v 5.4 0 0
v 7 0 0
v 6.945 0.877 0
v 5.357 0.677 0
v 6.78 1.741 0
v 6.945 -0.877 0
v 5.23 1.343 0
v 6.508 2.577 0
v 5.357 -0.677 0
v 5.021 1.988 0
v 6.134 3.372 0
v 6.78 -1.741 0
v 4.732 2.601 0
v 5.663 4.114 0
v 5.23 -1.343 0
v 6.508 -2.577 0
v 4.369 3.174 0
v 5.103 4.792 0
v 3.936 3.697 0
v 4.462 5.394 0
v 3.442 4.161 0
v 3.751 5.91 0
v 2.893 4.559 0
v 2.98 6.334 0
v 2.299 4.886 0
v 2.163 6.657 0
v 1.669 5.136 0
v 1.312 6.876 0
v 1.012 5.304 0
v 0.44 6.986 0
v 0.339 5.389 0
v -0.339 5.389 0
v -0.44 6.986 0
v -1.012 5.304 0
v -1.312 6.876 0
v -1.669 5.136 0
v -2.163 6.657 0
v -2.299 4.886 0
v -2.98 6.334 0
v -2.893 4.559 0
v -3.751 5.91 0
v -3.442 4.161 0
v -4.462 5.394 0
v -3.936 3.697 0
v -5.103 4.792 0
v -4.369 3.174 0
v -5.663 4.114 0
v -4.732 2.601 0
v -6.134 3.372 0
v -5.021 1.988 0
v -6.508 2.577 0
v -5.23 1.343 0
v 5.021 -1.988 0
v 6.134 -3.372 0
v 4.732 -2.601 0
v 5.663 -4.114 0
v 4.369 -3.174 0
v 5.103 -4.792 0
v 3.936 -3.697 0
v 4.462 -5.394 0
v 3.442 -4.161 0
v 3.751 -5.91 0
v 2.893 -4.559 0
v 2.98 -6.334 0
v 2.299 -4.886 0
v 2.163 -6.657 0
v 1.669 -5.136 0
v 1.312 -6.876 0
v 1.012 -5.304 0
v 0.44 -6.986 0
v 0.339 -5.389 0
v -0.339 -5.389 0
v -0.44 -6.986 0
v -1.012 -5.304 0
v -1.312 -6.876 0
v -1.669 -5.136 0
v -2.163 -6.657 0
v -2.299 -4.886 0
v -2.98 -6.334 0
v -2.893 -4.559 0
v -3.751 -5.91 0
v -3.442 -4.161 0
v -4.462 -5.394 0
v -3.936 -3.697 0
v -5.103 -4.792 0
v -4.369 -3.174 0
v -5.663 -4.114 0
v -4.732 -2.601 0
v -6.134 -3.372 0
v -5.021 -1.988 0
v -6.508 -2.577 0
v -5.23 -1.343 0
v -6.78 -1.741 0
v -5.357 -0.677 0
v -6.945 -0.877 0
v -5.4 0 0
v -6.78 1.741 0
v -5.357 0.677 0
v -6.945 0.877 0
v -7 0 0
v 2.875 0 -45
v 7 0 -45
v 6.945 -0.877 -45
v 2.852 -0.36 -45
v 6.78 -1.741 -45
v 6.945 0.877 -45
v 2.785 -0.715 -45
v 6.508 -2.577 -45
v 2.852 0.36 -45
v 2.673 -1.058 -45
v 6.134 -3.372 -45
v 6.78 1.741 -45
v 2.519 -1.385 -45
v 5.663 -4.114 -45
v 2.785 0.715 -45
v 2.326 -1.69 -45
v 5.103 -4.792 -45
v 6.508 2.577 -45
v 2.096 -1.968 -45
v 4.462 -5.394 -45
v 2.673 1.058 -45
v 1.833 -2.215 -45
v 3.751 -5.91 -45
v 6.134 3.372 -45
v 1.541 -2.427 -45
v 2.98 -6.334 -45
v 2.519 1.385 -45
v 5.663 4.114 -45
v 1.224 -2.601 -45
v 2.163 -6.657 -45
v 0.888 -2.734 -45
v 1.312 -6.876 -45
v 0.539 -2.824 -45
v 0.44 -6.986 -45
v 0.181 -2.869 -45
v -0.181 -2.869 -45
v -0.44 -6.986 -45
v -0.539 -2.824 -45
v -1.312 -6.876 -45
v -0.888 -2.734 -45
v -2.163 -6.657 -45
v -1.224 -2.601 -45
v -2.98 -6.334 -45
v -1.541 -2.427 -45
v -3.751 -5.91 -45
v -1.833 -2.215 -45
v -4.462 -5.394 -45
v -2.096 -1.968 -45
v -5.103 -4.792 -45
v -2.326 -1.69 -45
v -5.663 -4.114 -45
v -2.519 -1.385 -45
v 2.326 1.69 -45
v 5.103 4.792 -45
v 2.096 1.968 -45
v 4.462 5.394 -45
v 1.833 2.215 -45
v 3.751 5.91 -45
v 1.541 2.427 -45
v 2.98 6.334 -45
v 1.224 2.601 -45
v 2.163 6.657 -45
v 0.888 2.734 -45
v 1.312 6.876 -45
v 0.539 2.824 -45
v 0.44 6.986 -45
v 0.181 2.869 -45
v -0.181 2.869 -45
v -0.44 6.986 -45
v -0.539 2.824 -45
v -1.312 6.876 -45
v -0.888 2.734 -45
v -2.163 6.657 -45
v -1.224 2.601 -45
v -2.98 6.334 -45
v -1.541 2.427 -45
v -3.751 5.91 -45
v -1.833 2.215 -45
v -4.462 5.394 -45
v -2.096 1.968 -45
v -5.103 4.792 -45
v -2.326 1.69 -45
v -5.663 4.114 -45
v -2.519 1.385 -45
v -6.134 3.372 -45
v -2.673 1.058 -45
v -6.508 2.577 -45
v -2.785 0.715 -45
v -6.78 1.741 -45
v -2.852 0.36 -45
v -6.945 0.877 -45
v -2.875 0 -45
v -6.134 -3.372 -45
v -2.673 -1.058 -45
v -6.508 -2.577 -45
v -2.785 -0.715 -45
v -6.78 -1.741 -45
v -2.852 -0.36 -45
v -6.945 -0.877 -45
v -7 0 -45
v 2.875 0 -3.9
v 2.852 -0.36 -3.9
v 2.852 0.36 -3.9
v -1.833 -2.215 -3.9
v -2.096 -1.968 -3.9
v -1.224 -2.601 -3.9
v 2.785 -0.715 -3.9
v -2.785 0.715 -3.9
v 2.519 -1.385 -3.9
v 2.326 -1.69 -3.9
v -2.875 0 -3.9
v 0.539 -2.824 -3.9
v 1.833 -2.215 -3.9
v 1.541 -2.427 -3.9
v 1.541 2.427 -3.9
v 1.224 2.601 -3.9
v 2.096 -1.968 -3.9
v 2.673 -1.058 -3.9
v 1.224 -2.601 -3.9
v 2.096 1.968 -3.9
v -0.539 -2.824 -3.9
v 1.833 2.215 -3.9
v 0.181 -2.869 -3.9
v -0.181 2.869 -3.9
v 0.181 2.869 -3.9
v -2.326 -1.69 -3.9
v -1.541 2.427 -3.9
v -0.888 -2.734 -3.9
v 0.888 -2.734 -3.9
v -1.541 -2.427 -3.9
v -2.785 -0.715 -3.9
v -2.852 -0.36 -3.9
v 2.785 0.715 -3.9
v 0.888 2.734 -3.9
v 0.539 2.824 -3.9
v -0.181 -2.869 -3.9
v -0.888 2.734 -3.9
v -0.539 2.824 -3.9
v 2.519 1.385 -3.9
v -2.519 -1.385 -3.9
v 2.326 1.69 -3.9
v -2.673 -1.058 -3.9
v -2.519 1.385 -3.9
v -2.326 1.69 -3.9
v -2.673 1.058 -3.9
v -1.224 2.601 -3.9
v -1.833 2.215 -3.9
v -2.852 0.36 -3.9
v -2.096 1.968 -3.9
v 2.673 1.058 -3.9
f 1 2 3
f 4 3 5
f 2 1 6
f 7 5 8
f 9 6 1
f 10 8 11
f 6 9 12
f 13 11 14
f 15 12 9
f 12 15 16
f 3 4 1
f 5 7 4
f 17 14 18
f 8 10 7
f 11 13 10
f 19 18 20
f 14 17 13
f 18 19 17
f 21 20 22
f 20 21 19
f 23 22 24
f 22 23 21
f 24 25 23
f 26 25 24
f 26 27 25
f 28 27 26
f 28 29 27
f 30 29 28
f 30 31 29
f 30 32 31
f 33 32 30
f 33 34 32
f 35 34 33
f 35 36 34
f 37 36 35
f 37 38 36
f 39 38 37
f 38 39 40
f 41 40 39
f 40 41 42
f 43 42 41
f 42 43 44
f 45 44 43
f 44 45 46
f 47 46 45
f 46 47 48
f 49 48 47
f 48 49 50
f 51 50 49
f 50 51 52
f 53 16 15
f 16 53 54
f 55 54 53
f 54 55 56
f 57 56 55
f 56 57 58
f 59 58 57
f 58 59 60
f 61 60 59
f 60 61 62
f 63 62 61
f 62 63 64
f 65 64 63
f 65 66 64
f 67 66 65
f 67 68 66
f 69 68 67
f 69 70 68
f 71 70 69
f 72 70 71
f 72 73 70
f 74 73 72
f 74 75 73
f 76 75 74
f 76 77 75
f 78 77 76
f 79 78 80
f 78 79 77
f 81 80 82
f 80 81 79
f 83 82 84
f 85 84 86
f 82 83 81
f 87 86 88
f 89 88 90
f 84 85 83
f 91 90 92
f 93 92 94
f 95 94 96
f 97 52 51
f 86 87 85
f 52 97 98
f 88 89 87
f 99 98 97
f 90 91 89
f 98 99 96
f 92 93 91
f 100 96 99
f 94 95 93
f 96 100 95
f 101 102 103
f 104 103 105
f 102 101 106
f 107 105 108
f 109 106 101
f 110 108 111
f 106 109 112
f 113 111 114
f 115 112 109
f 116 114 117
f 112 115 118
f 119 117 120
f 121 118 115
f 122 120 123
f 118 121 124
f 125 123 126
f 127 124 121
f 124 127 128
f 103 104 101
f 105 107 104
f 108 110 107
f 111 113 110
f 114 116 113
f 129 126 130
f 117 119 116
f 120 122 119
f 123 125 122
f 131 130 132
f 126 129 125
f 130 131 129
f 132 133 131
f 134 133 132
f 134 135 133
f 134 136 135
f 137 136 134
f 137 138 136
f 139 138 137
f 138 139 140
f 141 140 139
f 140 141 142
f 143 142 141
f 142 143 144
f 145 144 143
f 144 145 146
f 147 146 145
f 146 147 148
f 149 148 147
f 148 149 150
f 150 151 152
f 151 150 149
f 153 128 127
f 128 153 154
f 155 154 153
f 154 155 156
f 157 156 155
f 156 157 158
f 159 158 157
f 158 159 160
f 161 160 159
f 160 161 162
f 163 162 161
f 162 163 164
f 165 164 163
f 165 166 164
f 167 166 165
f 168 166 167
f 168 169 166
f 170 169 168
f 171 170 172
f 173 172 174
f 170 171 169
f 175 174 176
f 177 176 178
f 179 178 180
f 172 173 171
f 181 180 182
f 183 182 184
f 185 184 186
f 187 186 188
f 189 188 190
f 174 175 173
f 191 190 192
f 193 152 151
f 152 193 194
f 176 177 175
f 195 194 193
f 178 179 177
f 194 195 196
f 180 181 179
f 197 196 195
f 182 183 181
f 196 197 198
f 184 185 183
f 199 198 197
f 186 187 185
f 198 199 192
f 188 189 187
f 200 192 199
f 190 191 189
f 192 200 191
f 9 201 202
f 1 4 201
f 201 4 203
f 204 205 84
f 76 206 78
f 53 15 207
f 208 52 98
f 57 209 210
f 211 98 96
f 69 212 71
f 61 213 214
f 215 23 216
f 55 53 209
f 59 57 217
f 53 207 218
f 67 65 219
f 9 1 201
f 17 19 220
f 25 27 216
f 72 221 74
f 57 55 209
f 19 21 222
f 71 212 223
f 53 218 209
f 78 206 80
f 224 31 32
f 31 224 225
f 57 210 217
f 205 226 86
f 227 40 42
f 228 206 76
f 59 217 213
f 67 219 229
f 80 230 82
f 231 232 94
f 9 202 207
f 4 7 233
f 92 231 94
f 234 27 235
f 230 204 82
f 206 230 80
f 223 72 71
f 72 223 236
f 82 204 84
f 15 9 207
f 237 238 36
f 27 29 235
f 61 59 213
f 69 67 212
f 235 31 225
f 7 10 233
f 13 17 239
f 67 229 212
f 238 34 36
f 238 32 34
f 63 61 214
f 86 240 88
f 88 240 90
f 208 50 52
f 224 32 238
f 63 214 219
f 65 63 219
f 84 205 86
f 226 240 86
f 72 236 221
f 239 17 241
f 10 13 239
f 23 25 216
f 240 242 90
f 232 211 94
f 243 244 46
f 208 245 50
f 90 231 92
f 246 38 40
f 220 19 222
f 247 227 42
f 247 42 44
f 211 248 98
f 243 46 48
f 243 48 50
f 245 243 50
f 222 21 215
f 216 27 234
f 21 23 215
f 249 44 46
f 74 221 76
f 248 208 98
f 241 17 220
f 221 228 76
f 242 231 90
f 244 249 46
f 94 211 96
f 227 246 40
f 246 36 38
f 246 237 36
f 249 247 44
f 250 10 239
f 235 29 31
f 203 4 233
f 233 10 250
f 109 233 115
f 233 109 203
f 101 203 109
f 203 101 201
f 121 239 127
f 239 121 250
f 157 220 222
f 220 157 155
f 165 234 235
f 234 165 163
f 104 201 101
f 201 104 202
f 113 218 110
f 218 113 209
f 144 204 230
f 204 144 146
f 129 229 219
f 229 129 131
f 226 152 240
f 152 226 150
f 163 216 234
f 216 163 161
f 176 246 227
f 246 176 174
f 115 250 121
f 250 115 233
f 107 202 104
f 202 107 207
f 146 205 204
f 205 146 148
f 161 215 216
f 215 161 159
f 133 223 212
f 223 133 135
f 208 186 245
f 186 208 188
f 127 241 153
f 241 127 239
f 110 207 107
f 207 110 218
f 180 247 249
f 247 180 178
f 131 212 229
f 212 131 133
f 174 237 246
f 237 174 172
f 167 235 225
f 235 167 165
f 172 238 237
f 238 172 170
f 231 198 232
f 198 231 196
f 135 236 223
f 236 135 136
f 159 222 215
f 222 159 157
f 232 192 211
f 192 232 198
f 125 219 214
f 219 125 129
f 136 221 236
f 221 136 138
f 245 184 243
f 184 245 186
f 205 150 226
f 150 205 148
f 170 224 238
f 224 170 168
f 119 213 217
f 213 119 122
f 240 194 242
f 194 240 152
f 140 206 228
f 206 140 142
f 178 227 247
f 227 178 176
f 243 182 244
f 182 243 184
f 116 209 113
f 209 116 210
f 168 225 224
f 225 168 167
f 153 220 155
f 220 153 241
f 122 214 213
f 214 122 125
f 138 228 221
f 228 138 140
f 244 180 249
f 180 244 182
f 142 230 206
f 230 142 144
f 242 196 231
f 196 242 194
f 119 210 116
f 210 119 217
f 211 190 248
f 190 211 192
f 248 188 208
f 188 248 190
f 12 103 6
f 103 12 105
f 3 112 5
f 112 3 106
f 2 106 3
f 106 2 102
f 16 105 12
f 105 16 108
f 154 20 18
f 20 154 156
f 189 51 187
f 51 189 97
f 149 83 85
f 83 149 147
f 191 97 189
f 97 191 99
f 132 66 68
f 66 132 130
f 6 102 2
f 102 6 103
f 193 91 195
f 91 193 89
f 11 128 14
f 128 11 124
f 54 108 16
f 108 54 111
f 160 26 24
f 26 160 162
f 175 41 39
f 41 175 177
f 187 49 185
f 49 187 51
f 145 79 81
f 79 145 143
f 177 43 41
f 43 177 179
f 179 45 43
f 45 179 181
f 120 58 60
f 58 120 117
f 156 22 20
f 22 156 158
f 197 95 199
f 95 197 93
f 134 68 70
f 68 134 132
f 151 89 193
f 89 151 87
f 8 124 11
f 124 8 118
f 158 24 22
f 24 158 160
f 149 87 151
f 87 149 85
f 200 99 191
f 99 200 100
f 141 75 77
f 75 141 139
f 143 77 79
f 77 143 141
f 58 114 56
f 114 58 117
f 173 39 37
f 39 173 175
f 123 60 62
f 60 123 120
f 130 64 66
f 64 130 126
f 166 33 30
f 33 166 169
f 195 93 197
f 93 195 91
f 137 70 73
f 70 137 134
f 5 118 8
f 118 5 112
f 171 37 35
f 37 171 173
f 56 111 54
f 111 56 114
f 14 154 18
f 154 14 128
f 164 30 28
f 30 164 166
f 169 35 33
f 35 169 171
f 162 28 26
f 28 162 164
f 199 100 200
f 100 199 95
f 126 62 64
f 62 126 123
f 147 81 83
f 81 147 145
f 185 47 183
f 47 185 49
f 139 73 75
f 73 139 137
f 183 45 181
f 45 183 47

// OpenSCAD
$fn = 50;


difference() {
	union() {
		translate(v = [0, 0, -45.0000000000]) {
			cylinder(h = 45, r = 7.0000000000);
		}
		cylinder(h = 0, r = 17.0000000000);
	}
	union() {
		translate(v = [0, 0, 0]) {
			rotate(a = [0, 0, 0]) {
				difference() {
					union() {
						#translate(v = [0, 0, -45.0000000000]) {
							cylinder(h = 45, r = 2.6000000000);
						}
						#translate(v = [0, 0, -3.9000000000]) {
							cylinder(h = 3.9000000000, r = 7.0000000000, r1 = 2.8750000000, r2 = 5.4000000000);
						}
						#translate(v = [0, 0, -45.0000000000]) {
							cylinder(h = 45, r = 2.8750000000);
						}
						#translate(v = [0, 0, -45.0000000000]) {
							cylinder(h = 45, r = 2.6000000000);
						}
					}
					union();
				}
			}
		}
	}
}
